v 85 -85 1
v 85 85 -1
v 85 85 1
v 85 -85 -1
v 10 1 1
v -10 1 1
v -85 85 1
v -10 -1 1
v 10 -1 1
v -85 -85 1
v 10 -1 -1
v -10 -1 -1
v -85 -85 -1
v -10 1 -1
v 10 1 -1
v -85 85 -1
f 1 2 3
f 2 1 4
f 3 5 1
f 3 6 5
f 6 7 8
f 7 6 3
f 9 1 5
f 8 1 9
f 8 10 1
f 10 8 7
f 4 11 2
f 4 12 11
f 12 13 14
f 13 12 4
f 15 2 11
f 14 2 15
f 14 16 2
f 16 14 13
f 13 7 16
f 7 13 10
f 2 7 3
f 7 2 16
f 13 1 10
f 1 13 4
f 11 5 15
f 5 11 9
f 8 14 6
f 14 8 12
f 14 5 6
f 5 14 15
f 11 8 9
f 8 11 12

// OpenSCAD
// ========================================
// a 170 x 170 x 2 mm plate with one 20 x 2 mm slots
// NeuroCAD canonical IR; dimensions are millimetres
// ========================================
$fn = 48;

difference() {
  cube(size=[170, 170, 2], center=true);
  cube(size=[20, 2, 4], center=true);
}
